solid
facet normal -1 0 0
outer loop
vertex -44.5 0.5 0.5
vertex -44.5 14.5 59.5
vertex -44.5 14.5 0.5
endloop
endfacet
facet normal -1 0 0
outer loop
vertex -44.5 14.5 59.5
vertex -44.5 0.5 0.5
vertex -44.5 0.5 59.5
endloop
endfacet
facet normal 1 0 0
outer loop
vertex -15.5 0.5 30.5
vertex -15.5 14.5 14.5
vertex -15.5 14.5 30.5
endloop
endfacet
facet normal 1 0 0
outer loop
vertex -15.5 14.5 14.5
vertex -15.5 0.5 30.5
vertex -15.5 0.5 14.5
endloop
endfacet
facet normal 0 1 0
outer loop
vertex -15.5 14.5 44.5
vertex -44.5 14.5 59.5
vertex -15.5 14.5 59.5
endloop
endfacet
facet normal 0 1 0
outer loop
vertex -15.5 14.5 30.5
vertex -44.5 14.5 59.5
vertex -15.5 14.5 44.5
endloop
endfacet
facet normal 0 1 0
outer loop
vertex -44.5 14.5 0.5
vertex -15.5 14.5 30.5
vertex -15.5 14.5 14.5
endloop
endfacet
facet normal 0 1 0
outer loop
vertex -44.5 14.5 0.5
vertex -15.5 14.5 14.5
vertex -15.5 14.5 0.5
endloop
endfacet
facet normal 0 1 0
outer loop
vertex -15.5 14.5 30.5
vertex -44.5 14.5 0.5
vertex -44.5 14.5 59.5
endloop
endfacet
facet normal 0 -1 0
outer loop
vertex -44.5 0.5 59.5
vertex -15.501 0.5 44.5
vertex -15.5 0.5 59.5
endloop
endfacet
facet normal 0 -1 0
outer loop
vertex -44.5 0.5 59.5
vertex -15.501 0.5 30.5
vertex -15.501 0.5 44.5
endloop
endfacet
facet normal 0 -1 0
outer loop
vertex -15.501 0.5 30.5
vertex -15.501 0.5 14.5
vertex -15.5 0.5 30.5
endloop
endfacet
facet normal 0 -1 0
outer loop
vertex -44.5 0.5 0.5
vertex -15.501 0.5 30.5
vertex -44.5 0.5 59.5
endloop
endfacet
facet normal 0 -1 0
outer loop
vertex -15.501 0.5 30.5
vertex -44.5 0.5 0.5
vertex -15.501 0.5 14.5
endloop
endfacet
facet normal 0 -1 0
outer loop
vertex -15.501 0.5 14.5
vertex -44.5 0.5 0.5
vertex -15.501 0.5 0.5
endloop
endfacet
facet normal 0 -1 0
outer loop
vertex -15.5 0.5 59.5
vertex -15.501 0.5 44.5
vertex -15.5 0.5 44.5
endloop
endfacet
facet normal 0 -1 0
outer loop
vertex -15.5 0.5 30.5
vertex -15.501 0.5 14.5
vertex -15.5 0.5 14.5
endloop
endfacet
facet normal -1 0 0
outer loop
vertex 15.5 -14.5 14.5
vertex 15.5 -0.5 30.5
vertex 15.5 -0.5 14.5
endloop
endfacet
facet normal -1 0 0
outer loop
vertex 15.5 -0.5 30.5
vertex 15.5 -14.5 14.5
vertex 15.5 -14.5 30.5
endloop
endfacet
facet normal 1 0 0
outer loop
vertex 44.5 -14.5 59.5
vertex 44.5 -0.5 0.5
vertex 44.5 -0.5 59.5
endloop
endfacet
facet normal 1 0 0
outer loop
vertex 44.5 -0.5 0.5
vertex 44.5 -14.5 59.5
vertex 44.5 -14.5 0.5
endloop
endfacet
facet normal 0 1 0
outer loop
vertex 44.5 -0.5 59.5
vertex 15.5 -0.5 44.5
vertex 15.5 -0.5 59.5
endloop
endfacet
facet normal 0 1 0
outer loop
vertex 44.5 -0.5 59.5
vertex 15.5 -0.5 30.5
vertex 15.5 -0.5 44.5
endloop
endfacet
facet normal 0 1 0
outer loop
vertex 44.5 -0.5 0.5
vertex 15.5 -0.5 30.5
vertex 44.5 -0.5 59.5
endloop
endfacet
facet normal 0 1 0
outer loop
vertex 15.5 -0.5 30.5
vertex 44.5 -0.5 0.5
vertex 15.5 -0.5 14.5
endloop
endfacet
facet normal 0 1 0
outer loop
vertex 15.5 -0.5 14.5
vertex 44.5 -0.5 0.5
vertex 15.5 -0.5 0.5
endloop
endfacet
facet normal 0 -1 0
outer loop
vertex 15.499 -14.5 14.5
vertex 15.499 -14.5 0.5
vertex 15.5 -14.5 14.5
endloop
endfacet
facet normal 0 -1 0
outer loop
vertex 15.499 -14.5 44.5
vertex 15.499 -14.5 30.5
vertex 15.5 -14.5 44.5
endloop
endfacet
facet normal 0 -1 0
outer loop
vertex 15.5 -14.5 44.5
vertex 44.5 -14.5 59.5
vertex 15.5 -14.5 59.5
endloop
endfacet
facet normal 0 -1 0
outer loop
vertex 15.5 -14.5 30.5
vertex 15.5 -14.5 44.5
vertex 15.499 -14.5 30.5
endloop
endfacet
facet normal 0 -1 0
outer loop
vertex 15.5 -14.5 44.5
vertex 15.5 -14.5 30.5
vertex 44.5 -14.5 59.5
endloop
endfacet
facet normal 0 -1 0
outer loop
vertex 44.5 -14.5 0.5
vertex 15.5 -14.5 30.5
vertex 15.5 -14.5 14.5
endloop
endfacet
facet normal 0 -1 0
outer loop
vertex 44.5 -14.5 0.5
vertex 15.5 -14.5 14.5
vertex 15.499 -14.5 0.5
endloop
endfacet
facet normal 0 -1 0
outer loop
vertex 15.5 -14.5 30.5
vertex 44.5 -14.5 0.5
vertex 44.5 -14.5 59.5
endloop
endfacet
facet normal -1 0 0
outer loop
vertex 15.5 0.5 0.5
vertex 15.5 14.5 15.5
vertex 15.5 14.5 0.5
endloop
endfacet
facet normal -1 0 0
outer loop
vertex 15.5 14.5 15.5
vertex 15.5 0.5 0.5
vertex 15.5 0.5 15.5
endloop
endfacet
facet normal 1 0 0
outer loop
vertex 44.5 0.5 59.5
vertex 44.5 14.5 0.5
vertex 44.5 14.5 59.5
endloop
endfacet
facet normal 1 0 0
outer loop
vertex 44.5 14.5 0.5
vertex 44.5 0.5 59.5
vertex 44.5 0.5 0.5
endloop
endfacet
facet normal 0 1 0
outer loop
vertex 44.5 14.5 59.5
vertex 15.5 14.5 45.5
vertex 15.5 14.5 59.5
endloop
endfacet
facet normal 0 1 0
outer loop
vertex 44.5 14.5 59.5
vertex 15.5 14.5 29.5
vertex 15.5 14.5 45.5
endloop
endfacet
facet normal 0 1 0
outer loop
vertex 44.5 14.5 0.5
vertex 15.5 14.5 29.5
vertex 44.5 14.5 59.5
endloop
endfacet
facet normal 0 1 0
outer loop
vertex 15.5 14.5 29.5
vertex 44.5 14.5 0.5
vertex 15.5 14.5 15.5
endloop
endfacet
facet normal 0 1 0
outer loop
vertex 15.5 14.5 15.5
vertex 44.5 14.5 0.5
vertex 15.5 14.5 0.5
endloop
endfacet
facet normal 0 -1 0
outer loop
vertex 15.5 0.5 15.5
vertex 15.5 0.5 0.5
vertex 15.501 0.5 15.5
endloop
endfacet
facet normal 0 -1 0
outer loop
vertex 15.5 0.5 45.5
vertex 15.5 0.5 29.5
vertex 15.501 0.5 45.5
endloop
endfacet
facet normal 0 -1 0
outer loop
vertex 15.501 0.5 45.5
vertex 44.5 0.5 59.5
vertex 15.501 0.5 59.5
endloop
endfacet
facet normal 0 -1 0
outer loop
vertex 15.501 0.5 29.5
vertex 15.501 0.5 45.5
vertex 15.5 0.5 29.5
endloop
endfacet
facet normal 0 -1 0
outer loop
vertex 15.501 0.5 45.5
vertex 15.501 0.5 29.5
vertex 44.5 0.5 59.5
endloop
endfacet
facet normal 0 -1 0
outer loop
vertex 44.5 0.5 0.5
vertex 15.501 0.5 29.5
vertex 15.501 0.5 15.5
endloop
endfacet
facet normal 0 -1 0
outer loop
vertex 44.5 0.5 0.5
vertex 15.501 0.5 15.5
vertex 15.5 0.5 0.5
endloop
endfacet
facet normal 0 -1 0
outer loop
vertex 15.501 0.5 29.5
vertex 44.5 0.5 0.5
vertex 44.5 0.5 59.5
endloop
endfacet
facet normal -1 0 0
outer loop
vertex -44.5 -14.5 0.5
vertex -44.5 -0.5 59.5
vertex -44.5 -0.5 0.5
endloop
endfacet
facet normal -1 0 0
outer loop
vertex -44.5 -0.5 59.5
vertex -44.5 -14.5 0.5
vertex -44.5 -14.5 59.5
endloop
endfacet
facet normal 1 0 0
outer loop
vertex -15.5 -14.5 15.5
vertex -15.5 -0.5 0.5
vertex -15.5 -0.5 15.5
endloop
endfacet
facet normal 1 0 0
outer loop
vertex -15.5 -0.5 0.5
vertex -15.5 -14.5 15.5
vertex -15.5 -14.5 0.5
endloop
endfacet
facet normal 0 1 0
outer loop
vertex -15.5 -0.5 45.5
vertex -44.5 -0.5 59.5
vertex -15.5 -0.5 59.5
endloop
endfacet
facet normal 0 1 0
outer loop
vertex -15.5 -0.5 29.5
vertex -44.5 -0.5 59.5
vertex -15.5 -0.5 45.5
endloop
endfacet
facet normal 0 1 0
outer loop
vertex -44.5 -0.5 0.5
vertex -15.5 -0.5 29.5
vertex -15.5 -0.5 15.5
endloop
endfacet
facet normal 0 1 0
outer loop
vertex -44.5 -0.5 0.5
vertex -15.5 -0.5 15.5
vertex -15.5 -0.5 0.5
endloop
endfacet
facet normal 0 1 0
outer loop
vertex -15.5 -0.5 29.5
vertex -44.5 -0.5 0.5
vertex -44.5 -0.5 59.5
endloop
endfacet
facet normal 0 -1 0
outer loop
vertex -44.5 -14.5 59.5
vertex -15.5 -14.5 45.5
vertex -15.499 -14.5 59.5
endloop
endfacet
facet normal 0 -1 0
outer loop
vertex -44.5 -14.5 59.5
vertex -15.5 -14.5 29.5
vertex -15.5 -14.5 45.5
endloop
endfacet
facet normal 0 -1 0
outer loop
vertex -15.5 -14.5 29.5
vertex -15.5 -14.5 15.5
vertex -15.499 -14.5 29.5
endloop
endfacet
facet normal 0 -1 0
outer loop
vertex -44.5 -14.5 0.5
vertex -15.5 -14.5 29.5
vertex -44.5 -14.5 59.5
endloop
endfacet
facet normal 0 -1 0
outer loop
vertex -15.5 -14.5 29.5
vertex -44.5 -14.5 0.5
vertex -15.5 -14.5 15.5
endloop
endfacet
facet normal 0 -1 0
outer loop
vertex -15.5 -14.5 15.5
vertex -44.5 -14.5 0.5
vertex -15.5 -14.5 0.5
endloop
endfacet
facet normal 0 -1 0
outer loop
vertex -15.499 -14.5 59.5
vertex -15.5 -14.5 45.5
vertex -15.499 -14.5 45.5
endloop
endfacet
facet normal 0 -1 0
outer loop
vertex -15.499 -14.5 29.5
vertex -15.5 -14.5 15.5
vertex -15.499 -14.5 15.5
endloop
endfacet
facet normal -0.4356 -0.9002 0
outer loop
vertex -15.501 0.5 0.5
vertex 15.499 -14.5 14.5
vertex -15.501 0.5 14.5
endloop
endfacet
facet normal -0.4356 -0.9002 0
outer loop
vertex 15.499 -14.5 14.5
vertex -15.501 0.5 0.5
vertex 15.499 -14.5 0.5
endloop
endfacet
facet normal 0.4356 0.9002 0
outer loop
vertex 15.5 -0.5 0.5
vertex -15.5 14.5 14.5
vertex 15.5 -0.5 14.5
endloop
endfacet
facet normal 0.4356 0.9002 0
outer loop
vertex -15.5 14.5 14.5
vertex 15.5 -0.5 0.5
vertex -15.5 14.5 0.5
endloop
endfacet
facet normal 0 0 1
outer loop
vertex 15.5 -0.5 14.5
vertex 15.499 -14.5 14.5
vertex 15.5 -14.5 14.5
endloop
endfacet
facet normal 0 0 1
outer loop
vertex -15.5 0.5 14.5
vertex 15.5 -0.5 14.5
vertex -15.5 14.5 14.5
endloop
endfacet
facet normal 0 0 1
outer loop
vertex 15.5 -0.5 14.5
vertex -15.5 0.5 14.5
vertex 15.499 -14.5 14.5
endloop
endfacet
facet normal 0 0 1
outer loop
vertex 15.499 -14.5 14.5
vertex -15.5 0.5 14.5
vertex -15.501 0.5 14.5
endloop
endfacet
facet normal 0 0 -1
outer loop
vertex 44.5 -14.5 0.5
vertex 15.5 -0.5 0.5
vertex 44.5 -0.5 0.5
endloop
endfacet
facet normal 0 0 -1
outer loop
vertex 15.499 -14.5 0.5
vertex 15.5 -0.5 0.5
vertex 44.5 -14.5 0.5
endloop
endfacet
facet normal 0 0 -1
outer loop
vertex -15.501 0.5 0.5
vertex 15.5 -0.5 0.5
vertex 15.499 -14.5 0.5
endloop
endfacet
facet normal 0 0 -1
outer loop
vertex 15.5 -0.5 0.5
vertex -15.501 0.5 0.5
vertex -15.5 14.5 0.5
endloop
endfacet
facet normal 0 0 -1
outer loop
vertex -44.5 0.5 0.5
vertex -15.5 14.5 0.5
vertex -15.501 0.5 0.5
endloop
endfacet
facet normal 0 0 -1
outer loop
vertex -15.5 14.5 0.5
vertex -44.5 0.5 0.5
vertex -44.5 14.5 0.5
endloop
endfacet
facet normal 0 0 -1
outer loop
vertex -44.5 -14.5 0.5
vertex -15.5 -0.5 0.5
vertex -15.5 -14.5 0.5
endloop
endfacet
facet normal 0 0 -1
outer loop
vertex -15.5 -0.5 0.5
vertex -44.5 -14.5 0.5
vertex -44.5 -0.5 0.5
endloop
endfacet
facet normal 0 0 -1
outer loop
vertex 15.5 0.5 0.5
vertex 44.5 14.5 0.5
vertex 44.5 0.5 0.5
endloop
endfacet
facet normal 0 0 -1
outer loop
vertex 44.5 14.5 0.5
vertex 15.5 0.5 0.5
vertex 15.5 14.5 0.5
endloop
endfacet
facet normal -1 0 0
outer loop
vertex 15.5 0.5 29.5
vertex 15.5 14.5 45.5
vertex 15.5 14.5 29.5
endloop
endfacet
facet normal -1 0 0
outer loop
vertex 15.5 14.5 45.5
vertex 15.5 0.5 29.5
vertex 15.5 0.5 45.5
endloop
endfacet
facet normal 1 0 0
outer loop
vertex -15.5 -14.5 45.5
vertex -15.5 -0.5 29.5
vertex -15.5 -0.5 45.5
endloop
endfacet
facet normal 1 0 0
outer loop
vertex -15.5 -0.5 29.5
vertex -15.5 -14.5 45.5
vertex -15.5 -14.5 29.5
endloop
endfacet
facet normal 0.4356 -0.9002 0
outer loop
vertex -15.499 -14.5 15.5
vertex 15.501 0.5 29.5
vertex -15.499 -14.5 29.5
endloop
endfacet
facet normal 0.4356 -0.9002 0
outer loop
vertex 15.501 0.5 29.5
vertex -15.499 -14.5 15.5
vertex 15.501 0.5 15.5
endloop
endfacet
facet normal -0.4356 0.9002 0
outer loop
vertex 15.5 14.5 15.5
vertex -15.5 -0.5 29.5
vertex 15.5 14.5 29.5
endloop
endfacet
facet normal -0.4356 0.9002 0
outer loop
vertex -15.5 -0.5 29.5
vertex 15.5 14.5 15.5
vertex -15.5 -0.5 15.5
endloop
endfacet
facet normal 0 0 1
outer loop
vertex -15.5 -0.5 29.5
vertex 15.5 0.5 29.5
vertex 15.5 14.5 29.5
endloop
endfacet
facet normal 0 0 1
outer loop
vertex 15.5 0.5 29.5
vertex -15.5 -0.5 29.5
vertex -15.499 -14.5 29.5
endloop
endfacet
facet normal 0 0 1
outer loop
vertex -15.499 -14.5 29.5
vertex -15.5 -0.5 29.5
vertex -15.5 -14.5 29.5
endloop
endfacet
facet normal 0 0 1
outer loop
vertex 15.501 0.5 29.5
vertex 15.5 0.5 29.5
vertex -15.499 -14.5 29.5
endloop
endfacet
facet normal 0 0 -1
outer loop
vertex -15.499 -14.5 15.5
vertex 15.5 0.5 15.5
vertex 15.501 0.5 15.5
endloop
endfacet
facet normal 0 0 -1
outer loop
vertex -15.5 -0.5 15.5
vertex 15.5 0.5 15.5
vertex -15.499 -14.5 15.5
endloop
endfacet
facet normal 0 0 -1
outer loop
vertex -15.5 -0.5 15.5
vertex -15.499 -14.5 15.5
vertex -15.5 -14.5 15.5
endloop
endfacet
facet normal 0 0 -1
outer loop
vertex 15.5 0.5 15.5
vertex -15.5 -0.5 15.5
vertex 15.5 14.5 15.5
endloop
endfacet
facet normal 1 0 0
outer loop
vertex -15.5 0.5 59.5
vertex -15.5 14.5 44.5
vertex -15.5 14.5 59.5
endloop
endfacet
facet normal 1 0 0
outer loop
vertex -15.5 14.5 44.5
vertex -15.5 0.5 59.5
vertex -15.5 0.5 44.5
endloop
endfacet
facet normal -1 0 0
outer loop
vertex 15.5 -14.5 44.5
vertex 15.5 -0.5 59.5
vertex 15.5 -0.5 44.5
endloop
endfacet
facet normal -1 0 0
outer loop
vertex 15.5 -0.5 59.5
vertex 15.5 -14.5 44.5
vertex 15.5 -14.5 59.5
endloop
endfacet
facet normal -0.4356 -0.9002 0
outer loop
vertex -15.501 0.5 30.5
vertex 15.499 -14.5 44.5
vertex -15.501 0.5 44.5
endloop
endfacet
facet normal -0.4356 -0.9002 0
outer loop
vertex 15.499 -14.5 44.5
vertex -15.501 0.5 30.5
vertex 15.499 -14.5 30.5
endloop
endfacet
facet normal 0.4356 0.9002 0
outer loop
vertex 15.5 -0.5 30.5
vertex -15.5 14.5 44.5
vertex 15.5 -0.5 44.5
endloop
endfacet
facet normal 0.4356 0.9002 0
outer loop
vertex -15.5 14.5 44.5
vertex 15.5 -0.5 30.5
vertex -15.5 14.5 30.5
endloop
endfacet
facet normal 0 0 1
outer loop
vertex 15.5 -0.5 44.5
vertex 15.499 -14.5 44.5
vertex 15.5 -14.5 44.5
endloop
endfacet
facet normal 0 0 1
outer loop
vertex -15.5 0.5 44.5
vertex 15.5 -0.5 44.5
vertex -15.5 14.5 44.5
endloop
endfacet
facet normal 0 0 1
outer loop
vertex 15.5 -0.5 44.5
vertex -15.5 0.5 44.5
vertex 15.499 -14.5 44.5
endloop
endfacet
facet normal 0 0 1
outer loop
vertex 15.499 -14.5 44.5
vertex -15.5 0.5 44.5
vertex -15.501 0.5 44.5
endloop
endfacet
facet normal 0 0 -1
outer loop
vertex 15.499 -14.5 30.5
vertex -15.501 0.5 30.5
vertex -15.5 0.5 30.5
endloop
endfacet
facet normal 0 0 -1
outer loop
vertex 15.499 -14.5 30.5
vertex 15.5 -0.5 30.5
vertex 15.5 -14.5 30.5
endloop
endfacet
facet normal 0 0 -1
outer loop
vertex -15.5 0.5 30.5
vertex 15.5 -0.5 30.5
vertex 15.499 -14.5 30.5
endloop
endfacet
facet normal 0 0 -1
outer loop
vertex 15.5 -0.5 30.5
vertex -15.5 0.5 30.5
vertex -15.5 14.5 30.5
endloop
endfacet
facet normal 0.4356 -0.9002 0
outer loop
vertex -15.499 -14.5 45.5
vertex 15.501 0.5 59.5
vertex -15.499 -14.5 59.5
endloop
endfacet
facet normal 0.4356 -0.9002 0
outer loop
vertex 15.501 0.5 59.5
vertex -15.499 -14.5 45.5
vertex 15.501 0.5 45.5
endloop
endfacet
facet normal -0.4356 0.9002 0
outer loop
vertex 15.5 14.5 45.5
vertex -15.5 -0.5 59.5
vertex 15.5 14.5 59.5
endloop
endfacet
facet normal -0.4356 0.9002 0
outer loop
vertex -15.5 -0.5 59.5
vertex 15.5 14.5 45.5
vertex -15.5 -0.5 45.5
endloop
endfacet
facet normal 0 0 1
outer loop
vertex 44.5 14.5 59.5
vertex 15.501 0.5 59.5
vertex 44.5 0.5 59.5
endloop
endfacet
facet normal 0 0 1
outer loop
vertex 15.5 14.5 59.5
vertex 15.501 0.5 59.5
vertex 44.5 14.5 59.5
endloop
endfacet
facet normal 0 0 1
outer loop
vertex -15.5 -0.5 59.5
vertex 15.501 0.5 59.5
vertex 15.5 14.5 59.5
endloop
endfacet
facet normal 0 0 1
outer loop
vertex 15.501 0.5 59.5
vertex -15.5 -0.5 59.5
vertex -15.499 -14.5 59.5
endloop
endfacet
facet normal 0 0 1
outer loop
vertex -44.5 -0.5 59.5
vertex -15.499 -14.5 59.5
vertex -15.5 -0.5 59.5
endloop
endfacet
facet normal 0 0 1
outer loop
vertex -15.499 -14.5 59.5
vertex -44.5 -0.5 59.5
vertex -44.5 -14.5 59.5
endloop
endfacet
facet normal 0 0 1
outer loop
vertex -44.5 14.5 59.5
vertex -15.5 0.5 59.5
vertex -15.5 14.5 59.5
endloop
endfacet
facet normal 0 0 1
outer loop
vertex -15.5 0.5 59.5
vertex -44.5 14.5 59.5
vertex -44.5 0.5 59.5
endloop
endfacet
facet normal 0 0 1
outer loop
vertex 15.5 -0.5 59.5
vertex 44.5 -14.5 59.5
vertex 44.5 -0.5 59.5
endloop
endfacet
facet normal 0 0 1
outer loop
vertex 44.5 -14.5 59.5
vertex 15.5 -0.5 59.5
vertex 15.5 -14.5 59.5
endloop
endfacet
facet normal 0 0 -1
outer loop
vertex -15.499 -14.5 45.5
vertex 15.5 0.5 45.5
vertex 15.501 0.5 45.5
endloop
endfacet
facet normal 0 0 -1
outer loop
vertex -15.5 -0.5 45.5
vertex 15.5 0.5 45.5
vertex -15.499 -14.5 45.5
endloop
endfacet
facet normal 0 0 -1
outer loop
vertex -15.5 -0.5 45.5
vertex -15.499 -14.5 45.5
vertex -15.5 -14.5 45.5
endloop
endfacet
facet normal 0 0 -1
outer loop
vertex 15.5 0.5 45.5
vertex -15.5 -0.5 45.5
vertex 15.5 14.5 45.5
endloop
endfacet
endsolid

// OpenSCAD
gap=1;
grid=15;

module lubonify(count=4){
    intersection(){
        for(i=[0:count-1]) {
            translate([0,0,i*grid])
            if(i%2){
                children();
            } else {
                mirror([1,0,0]) children();
            }
        }
        translate([0,0,count*grid/2])
            cube([200,200,count*grid-gap],center=true);
    }
}
module icube(x=1,y=1,dx=0,dy=0,zgap=false){
    translate([dx*grid,dy*grid,0])
        translate([gap/2,gap/2,zgap ? gap/2 : 0])
        cube([x*grid-gap,y*grid-gap,grid-(zgap ? gap : 0)]);
}

module naive_spinny(){
    translate([0,0,gap/2])
        cylinder(r=grid-gap/2,h=grid-gap);
    difference(){
        union(){
            icube(4,1);
            icube(4,1,-4,-1);
        }
        translate([0,0,-.1])
        cylinder(r=grid-gap/2,h=grid+.2);
    }
    difference(){
        union(){
            icube(4,1,0,-1);
            icube(4,1,-4,0);
        }
        translate([0,0,-.1])
        cylinder(r=grid+gap/2,h=grid+.2);
    }
}

module spinny(){
    translate([0,0,gap/2])
        cylinder(r=grid-gap/2,h=grid-gap);
    icube(2,1,1,0);
    icube(2,1,-3,-1);
    icube(2,1,-3,0);
    icube(2,1,1,-1);
    icube(2,1,0,0, zgap=true);
    icube(2,1,-2,-1, zgap=true);
}

module unspinny(){
    icube(2,1,1,0);
    icube(2,1,-3,-1);
    icube(2,1,-3,0);
    icube(2,1,1,-1);
    hull(){
        translate([grid+gap/2,gap/2,gap/2])
            cube([.001,grid-gap,grid-gap]);
        translate([-grid-gap/2,-grid+gap/2,gap/2])
            cube([.001,grid-gap,grid-gap]);
    }
}
//#rotate([0,0,45]) cube([100,.001,100], center=true);
lubonify() unspinny();
